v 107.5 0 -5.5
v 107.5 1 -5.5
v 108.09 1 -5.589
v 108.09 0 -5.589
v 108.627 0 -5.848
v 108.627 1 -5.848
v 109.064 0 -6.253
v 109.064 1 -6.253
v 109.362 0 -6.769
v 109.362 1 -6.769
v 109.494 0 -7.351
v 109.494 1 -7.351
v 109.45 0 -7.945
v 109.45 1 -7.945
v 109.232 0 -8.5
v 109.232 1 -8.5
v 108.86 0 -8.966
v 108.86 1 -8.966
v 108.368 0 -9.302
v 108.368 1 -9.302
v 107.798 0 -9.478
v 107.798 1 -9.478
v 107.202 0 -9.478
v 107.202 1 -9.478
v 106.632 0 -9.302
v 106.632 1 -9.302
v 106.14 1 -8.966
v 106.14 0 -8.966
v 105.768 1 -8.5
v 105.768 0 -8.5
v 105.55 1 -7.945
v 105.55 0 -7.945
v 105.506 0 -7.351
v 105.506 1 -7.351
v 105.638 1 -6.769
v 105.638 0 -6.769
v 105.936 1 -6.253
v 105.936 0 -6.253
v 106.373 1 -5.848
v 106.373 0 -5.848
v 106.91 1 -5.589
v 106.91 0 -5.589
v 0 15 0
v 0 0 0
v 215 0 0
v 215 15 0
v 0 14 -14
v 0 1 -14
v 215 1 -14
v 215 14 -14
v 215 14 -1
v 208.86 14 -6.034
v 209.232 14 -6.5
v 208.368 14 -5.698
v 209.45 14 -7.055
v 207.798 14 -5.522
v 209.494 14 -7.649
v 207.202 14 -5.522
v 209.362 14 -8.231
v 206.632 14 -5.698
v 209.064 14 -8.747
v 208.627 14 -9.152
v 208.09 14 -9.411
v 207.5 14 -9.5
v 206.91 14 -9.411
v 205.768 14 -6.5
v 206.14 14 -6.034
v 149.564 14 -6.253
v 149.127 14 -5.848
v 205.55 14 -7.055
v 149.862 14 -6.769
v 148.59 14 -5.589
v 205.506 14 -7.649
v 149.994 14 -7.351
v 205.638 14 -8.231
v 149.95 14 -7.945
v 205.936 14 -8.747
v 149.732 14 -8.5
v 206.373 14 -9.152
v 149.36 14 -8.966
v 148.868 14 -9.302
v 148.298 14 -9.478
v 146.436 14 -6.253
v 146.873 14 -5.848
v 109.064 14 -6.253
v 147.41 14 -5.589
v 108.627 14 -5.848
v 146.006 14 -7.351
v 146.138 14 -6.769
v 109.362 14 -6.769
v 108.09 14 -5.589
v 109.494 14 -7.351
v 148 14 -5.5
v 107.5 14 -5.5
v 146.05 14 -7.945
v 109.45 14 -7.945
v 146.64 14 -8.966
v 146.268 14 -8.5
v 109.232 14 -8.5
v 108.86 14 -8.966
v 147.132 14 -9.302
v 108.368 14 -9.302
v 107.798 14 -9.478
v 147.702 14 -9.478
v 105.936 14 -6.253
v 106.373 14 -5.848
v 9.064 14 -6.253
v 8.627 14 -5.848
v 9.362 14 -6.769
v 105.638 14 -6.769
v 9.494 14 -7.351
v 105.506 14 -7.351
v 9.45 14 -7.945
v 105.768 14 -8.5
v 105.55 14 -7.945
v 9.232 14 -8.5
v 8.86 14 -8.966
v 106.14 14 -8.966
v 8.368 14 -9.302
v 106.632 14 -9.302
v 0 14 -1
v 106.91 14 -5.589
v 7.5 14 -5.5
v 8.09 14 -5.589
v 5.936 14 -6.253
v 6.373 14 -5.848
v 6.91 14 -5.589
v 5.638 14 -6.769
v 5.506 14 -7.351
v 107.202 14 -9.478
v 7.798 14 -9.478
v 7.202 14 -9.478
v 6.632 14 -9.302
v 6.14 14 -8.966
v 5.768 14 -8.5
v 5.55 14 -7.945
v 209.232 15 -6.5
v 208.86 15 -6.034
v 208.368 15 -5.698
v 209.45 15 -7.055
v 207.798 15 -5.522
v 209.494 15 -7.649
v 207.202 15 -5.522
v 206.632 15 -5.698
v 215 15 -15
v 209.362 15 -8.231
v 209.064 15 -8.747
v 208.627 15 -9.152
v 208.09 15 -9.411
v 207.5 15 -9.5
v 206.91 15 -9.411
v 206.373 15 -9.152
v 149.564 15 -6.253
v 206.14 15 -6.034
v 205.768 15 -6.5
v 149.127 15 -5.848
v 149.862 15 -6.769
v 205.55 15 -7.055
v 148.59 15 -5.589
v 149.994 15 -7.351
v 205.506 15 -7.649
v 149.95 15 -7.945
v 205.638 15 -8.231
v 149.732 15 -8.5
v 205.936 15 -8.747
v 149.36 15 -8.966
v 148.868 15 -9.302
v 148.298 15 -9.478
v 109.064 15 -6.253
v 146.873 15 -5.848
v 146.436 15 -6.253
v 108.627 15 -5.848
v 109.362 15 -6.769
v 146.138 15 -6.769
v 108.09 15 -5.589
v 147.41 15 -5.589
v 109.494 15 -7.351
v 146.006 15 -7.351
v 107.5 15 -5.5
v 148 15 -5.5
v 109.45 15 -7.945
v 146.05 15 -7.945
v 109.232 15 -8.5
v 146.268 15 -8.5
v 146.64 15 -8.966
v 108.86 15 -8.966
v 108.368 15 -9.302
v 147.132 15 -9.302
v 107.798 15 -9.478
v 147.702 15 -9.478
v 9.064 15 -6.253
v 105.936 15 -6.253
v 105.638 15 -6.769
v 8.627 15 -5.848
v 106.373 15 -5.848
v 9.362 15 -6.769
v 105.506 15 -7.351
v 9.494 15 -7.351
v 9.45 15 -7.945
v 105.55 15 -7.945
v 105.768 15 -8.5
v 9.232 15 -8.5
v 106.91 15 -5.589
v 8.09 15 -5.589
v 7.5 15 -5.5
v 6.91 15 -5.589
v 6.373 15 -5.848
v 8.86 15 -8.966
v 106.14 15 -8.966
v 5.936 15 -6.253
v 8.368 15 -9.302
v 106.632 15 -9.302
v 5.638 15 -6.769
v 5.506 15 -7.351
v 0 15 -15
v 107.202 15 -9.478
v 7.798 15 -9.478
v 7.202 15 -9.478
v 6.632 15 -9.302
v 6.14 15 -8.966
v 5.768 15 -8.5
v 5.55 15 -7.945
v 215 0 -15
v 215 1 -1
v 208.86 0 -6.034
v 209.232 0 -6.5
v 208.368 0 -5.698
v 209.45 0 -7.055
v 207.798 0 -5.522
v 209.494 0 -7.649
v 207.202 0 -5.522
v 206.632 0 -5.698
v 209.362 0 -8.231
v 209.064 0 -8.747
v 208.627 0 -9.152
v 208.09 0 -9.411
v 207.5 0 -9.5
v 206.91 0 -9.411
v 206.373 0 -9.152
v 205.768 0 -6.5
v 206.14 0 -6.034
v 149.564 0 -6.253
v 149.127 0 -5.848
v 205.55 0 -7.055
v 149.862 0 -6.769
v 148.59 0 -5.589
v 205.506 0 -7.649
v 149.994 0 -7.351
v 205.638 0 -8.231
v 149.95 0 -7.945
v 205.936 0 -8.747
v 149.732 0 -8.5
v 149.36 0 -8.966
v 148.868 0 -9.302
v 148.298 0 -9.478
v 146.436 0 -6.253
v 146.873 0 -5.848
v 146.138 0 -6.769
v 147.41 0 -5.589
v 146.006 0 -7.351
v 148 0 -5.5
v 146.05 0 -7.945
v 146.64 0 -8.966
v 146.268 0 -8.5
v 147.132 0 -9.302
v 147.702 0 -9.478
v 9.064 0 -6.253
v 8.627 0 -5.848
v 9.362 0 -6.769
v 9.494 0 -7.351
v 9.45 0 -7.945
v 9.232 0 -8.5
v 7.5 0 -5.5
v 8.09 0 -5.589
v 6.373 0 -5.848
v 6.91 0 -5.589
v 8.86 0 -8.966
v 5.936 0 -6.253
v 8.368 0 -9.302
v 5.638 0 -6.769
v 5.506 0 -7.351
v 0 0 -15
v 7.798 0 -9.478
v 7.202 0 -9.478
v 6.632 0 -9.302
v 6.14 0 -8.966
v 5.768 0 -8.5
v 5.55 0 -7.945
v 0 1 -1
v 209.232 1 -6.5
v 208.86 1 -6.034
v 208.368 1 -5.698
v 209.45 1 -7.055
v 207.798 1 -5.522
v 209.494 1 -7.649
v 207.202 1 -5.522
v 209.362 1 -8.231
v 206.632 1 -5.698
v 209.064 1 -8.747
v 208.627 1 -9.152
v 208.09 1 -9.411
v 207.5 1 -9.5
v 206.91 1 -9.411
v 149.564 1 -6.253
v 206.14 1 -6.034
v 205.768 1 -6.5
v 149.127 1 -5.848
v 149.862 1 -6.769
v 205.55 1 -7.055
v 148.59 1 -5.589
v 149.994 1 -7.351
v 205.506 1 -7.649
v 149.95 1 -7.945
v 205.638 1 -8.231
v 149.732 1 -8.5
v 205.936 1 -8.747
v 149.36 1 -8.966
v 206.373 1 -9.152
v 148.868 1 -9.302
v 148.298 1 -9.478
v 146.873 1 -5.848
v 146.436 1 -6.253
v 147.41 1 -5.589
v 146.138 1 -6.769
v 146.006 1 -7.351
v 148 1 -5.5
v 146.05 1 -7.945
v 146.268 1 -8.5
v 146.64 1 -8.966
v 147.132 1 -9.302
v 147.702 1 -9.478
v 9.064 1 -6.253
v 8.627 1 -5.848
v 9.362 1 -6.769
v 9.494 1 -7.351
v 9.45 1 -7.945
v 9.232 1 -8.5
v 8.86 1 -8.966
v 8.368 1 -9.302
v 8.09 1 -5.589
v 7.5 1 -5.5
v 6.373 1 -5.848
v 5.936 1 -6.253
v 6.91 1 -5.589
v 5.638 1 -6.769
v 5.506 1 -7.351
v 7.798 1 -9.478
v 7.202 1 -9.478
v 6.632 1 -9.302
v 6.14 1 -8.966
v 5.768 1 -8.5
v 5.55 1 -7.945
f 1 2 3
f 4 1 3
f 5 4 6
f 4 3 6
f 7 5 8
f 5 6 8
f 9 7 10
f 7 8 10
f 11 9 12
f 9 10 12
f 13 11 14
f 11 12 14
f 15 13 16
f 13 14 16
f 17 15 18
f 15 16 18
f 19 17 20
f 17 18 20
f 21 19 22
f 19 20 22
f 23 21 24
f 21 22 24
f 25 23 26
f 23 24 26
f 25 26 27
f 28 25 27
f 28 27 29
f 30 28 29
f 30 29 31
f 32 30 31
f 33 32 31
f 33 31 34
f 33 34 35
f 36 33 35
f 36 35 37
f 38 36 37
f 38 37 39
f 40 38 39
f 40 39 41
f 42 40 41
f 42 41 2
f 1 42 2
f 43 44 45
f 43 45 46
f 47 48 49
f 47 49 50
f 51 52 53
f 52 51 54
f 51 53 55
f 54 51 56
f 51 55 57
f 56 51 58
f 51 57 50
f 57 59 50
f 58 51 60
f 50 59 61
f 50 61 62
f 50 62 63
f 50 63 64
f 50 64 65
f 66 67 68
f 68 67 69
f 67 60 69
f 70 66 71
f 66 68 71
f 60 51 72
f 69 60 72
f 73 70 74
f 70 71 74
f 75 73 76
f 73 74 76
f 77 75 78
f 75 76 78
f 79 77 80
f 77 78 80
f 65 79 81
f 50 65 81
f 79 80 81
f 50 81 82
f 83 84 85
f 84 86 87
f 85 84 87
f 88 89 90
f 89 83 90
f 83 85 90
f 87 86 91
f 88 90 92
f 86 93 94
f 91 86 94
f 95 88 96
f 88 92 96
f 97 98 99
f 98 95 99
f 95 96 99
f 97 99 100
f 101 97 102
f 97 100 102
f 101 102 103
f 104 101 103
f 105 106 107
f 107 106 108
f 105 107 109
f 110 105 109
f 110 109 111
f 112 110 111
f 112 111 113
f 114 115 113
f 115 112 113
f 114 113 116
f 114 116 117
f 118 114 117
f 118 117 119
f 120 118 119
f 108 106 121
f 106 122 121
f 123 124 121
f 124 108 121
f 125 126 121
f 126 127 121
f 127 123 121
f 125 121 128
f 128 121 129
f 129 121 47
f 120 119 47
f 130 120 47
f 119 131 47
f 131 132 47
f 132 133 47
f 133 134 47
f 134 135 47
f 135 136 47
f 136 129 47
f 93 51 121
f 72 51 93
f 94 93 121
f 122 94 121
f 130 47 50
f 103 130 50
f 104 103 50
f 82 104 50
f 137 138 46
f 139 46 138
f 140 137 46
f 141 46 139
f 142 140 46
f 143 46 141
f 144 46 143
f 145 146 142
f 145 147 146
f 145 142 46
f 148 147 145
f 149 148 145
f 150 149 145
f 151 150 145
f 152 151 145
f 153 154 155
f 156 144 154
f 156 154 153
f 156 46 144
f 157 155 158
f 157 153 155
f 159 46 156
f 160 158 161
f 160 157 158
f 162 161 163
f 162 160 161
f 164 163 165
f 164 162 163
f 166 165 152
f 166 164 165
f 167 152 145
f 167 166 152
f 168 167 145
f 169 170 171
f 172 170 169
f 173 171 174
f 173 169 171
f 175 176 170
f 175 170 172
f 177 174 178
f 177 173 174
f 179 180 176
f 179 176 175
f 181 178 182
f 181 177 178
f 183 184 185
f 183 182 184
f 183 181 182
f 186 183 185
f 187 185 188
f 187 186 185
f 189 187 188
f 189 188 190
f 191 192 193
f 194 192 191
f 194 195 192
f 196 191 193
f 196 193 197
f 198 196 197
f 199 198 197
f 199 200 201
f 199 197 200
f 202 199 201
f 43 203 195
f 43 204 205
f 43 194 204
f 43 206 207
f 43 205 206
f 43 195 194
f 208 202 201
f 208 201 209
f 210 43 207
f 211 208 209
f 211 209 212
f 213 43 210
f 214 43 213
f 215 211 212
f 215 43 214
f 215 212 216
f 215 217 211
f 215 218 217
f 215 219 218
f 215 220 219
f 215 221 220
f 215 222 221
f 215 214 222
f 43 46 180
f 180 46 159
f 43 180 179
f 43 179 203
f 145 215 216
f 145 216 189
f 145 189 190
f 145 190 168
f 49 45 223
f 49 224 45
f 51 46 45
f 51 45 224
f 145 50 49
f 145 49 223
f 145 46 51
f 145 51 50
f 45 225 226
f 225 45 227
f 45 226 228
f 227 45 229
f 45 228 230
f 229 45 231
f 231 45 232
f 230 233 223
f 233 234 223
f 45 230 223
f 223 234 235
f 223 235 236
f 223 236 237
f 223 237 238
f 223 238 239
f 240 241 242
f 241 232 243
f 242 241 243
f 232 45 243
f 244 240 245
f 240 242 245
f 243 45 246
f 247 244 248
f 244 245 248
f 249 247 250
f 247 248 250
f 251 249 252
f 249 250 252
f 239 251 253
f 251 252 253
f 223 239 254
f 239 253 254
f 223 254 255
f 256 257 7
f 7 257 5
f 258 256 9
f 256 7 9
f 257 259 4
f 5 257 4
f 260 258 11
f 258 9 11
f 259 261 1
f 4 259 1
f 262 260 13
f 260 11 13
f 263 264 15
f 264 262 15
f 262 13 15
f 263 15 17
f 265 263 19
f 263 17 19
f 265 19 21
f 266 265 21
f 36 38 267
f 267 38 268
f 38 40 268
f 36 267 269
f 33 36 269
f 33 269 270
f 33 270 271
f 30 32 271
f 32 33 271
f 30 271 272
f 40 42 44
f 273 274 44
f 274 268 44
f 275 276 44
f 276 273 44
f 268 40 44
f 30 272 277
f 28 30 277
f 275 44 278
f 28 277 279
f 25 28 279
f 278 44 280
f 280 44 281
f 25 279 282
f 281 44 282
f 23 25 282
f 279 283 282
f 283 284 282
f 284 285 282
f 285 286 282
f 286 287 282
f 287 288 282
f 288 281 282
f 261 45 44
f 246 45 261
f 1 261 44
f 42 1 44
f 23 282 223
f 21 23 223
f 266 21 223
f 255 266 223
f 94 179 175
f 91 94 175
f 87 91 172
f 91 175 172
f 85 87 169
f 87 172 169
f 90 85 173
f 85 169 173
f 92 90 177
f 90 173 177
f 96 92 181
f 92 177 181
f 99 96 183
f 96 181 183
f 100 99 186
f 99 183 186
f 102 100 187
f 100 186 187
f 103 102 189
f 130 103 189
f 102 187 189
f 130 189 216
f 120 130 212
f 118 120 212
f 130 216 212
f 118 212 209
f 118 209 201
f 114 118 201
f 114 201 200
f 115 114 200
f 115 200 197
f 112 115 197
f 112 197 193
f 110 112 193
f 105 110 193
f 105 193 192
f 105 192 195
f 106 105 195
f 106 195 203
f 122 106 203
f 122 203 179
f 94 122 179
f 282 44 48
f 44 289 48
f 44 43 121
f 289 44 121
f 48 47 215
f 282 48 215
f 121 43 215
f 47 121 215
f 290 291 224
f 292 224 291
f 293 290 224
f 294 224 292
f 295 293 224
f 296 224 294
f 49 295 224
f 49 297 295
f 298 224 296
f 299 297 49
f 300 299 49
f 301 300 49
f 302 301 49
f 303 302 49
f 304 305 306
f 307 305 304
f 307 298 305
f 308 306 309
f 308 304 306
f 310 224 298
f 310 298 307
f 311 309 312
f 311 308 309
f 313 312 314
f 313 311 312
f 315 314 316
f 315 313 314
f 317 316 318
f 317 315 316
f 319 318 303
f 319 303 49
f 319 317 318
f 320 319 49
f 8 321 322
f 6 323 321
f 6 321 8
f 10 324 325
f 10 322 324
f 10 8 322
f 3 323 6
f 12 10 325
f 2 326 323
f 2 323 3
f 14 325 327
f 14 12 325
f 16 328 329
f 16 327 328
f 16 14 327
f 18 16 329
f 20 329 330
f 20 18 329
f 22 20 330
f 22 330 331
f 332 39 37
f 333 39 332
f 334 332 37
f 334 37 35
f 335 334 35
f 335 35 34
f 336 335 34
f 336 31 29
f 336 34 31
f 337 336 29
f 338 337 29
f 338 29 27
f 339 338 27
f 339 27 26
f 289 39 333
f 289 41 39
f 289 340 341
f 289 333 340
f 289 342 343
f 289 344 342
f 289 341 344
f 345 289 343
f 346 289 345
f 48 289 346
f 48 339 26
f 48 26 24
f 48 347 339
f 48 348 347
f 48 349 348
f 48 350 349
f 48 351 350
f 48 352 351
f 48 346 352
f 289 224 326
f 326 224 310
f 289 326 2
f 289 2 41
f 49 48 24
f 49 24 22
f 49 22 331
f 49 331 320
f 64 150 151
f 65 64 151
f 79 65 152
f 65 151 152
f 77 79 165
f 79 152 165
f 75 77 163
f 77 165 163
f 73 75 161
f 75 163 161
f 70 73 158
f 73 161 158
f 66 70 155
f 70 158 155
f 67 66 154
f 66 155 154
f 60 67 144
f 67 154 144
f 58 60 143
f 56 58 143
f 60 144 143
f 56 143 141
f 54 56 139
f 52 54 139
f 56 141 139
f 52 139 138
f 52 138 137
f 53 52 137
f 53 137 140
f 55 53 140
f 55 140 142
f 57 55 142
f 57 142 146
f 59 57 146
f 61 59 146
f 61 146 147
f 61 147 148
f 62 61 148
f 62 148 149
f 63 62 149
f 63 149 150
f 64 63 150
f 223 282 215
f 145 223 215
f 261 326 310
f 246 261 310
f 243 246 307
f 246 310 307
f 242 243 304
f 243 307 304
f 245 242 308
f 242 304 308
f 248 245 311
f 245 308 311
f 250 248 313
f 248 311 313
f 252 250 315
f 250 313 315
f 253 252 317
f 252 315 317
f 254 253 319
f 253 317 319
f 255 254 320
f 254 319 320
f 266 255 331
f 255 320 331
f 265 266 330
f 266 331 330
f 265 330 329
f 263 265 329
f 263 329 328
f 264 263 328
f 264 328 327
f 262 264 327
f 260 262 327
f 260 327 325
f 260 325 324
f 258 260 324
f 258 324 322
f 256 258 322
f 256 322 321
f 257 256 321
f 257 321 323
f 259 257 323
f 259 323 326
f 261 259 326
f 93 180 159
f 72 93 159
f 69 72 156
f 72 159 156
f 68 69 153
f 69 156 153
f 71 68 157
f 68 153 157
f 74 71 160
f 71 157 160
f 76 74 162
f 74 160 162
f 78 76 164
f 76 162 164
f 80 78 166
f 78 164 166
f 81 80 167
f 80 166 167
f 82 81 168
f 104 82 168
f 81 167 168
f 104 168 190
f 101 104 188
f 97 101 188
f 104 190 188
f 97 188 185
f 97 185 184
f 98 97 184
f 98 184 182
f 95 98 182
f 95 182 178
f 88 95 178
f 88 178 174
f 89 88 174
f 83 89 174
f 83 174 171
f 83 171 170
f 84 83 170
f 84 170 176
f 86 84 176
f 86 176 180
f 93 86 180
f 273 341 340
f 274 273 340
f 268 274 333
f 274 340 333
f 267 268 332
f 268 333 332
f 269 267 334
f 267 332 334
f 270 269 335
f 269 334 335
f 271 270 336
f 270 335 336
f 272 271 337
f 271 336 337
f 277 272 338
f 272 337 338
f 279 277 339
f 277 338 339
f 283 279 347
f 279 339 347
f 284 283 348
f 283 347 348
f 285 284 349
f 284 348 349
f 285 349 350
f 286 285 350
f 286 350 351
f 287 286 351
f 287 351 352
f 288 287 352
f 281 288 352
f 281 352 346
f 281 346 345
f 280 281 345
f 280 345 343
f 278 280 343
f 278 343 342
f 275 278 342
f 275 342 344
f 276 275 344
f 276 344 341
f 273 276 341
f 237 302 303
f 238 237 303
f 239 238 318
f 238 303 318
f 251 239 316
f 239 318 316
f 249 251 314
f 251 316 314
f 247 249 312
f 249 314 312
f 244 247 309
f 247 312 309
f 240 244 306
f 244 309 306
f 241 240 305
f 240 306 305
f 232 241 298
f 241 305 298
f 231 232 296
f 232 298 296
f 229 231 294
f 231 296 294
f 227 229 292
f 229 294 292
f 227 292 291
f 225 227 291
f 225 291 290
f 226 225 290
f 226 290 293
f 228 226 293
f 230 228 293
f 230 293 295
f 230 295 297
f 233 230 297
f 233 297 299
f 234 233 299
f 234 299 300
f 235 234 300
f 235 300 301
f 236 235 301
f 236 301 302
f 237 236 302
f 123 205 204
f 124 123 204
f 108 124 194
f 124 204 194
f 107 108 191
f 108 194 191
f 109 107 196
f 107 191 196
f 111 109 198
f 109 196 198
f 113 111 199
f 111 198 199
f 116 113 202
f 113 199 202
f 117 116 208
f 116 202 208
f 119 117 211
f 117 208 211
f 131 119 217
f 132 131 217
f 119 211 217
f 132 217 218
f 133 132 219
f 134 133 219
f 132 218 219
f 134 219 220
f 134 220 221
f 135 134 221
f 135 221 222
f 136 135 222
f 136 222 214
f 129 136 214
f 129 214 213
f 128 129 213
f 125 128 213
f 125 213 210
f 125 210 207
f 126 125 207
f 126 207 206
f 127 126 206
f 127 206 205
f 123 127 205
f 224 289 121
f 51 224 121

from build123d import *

# Parameters (mm, degrees)
SKETCH_1_W          = 15
SKETCH_1_H          = 15
SKETCH_1_W_2        = 13
SKETCH_1_H_2        = 13
EXTRUDE_1_DEPTH     = 215
CUT_EXTRUDE_1_REACH = 218.044
SKETCH_2_R          = 2


with BuildPart() as part:
    # ｽｹｯﾁ1 → 押し出し-薄板1 (new body)
    with BuildSketch(Plane(origin=(0, 0, 0), x_dir=(0, 0, -1), z_dir=(1, 0, 0))):
        with Locations((7.5, 7.5)):
            Rectangle(SKETCH_1_W, SKETCH_1_H)
        with Locations((7.5, 7.5)):
            Rectangle(SKETCH_1_W_2, SKETCH_1_H_2, mode=Mode.SUBTRACT)
    extrude(amount=EXTRUDE_1_DEPTH)

    # ｶｯﾄ - 押し出し1: up to this face of the body (flat: up to its plane)
    cut_extrude_1_end = Plane(part.part.faces().sort_by_distance((107.5, 0, -7.5))[0])
    # ｽｹｯﾁ2 → ｶｯﾄ - 押し出し1 (cut, up to the picked face)
    with BuildSketch(Plane(origin=(0, 15, 0), x_dir=(1, 0, 0), z_dir=(0, 1, 0)), mode=Mode.PRIVATE) as cut_extrude_1_sk1:
        with Locations(Location((107.5, 7.5, 0), (0, 0, 270))):
            Circle(SKETCH_2_R)
    cut_extrude_1_tool1 = split(extrude(cut_extrude_1_sk1.sketch, amount=-CUT_EXTRUDE_1_REACH, mode=Mode.PRIVATE), bisect_by=cut_extrude_1_end, keep=Keep.BOTH, mode=Mode.PRIVATE)
    # ｽｹｯﾁ2 → ｶｯﾄ - 押し出し1 (cut, up to the picked face)
    with BuildSketch(Plane(origin=(0, 15, 0), x_dir=(1, 0, 0), z_dir=(0, 1, 0)), mode=Mode.PRIVATE) as cut_extrude_1_sk2:
        with Locations(Location((7.5, 7.5, 0), (0, 0, 270))):
            Circle(SKETCH_2_R)
    cut_extrude_1_tool2 = split(extrude(cut_extrude_1_sk2.sketch, amount=-CUT_EXTRUDE_1_REACH, mode=Mode.PRIVATE), bisect_by=cut_extrude_1_end, keep=Keep.BOTH, mode=Mode.PRIVATE)
    # ｽｹｯﾁ2 → ｶｯﾄ - 押し出し1 (cut, up to the picked face)
    with BuildSketch(Plane(origin=(0, 15, 0), x_dir=(1, 0, 0), z_dir=(0, 1, 0)), mode=Mode.PRIVATE) as cut_extrude_1_sk3:
        with Locations(Location((207.5, 7.5, 0), (0, 0, 90))):
            Circle(SKETCH_2_R)
    cut_extrude_1_tool3 = split(extrude(cut_extrude_1_sk3.sketch, amount=-CUT_EXTRUDE_1_REACH, mode=Mode.PRIVATE), bisect_by=cut_extrude_1_end, keep=Keep.BOTH, mode=Mode.PRIVATE)
    # ｽｹｯﾁ2 → ｶｯﾄ - 押し出し1 (cut, up to the picked face)
    with BuildSketch(Plane(origin=(0, 15, 0), x_dir=(1, 0, 0), z_dir=(0, 1, 0)), mode=Mode.PRIVATE) as cut_extrude_1_sk4:
        with Locations(Location((148, 7.5, 0), (0, 0, 270))):
            Circle(SKETCH_2_R)
    cut_extrude_1_tool4 = split(extrude(cut_extrude_1_sk4.sketch, amount=-CUT_EXTRUDE_1_REACH, mode=Mode.PRIVATE), bisect_by=cut_extrude_1_end, keep=Keep.BOTH, mode=Mode.PRIVATE)
    add(cut_extrude_1_tool1.solids().sort_by(Axis((107.5, 15, -7.5), (0, -1, 0)))[0], mode=Mode.SUBTRACT)
    add(cut_extrude_1_tool2.solids().sort_by(Axis((7.5, 15, -7.5), (0, -1, 0)))[0], mode=Mode.SUBTRACT)
    add(cut_extrude_1_tool3.solids().sort_by(Axis((207.5, 15, -7.5), (0, -1, 0)))[0], mode=Mode.SUBTRACT)
    add(cut_extrude_1_tool4.solids().sort_by(Axis((148, 15, -7.5), (0, -1, 0)))[0], mode=Mode.SUBTRACT)


solid = part.part
